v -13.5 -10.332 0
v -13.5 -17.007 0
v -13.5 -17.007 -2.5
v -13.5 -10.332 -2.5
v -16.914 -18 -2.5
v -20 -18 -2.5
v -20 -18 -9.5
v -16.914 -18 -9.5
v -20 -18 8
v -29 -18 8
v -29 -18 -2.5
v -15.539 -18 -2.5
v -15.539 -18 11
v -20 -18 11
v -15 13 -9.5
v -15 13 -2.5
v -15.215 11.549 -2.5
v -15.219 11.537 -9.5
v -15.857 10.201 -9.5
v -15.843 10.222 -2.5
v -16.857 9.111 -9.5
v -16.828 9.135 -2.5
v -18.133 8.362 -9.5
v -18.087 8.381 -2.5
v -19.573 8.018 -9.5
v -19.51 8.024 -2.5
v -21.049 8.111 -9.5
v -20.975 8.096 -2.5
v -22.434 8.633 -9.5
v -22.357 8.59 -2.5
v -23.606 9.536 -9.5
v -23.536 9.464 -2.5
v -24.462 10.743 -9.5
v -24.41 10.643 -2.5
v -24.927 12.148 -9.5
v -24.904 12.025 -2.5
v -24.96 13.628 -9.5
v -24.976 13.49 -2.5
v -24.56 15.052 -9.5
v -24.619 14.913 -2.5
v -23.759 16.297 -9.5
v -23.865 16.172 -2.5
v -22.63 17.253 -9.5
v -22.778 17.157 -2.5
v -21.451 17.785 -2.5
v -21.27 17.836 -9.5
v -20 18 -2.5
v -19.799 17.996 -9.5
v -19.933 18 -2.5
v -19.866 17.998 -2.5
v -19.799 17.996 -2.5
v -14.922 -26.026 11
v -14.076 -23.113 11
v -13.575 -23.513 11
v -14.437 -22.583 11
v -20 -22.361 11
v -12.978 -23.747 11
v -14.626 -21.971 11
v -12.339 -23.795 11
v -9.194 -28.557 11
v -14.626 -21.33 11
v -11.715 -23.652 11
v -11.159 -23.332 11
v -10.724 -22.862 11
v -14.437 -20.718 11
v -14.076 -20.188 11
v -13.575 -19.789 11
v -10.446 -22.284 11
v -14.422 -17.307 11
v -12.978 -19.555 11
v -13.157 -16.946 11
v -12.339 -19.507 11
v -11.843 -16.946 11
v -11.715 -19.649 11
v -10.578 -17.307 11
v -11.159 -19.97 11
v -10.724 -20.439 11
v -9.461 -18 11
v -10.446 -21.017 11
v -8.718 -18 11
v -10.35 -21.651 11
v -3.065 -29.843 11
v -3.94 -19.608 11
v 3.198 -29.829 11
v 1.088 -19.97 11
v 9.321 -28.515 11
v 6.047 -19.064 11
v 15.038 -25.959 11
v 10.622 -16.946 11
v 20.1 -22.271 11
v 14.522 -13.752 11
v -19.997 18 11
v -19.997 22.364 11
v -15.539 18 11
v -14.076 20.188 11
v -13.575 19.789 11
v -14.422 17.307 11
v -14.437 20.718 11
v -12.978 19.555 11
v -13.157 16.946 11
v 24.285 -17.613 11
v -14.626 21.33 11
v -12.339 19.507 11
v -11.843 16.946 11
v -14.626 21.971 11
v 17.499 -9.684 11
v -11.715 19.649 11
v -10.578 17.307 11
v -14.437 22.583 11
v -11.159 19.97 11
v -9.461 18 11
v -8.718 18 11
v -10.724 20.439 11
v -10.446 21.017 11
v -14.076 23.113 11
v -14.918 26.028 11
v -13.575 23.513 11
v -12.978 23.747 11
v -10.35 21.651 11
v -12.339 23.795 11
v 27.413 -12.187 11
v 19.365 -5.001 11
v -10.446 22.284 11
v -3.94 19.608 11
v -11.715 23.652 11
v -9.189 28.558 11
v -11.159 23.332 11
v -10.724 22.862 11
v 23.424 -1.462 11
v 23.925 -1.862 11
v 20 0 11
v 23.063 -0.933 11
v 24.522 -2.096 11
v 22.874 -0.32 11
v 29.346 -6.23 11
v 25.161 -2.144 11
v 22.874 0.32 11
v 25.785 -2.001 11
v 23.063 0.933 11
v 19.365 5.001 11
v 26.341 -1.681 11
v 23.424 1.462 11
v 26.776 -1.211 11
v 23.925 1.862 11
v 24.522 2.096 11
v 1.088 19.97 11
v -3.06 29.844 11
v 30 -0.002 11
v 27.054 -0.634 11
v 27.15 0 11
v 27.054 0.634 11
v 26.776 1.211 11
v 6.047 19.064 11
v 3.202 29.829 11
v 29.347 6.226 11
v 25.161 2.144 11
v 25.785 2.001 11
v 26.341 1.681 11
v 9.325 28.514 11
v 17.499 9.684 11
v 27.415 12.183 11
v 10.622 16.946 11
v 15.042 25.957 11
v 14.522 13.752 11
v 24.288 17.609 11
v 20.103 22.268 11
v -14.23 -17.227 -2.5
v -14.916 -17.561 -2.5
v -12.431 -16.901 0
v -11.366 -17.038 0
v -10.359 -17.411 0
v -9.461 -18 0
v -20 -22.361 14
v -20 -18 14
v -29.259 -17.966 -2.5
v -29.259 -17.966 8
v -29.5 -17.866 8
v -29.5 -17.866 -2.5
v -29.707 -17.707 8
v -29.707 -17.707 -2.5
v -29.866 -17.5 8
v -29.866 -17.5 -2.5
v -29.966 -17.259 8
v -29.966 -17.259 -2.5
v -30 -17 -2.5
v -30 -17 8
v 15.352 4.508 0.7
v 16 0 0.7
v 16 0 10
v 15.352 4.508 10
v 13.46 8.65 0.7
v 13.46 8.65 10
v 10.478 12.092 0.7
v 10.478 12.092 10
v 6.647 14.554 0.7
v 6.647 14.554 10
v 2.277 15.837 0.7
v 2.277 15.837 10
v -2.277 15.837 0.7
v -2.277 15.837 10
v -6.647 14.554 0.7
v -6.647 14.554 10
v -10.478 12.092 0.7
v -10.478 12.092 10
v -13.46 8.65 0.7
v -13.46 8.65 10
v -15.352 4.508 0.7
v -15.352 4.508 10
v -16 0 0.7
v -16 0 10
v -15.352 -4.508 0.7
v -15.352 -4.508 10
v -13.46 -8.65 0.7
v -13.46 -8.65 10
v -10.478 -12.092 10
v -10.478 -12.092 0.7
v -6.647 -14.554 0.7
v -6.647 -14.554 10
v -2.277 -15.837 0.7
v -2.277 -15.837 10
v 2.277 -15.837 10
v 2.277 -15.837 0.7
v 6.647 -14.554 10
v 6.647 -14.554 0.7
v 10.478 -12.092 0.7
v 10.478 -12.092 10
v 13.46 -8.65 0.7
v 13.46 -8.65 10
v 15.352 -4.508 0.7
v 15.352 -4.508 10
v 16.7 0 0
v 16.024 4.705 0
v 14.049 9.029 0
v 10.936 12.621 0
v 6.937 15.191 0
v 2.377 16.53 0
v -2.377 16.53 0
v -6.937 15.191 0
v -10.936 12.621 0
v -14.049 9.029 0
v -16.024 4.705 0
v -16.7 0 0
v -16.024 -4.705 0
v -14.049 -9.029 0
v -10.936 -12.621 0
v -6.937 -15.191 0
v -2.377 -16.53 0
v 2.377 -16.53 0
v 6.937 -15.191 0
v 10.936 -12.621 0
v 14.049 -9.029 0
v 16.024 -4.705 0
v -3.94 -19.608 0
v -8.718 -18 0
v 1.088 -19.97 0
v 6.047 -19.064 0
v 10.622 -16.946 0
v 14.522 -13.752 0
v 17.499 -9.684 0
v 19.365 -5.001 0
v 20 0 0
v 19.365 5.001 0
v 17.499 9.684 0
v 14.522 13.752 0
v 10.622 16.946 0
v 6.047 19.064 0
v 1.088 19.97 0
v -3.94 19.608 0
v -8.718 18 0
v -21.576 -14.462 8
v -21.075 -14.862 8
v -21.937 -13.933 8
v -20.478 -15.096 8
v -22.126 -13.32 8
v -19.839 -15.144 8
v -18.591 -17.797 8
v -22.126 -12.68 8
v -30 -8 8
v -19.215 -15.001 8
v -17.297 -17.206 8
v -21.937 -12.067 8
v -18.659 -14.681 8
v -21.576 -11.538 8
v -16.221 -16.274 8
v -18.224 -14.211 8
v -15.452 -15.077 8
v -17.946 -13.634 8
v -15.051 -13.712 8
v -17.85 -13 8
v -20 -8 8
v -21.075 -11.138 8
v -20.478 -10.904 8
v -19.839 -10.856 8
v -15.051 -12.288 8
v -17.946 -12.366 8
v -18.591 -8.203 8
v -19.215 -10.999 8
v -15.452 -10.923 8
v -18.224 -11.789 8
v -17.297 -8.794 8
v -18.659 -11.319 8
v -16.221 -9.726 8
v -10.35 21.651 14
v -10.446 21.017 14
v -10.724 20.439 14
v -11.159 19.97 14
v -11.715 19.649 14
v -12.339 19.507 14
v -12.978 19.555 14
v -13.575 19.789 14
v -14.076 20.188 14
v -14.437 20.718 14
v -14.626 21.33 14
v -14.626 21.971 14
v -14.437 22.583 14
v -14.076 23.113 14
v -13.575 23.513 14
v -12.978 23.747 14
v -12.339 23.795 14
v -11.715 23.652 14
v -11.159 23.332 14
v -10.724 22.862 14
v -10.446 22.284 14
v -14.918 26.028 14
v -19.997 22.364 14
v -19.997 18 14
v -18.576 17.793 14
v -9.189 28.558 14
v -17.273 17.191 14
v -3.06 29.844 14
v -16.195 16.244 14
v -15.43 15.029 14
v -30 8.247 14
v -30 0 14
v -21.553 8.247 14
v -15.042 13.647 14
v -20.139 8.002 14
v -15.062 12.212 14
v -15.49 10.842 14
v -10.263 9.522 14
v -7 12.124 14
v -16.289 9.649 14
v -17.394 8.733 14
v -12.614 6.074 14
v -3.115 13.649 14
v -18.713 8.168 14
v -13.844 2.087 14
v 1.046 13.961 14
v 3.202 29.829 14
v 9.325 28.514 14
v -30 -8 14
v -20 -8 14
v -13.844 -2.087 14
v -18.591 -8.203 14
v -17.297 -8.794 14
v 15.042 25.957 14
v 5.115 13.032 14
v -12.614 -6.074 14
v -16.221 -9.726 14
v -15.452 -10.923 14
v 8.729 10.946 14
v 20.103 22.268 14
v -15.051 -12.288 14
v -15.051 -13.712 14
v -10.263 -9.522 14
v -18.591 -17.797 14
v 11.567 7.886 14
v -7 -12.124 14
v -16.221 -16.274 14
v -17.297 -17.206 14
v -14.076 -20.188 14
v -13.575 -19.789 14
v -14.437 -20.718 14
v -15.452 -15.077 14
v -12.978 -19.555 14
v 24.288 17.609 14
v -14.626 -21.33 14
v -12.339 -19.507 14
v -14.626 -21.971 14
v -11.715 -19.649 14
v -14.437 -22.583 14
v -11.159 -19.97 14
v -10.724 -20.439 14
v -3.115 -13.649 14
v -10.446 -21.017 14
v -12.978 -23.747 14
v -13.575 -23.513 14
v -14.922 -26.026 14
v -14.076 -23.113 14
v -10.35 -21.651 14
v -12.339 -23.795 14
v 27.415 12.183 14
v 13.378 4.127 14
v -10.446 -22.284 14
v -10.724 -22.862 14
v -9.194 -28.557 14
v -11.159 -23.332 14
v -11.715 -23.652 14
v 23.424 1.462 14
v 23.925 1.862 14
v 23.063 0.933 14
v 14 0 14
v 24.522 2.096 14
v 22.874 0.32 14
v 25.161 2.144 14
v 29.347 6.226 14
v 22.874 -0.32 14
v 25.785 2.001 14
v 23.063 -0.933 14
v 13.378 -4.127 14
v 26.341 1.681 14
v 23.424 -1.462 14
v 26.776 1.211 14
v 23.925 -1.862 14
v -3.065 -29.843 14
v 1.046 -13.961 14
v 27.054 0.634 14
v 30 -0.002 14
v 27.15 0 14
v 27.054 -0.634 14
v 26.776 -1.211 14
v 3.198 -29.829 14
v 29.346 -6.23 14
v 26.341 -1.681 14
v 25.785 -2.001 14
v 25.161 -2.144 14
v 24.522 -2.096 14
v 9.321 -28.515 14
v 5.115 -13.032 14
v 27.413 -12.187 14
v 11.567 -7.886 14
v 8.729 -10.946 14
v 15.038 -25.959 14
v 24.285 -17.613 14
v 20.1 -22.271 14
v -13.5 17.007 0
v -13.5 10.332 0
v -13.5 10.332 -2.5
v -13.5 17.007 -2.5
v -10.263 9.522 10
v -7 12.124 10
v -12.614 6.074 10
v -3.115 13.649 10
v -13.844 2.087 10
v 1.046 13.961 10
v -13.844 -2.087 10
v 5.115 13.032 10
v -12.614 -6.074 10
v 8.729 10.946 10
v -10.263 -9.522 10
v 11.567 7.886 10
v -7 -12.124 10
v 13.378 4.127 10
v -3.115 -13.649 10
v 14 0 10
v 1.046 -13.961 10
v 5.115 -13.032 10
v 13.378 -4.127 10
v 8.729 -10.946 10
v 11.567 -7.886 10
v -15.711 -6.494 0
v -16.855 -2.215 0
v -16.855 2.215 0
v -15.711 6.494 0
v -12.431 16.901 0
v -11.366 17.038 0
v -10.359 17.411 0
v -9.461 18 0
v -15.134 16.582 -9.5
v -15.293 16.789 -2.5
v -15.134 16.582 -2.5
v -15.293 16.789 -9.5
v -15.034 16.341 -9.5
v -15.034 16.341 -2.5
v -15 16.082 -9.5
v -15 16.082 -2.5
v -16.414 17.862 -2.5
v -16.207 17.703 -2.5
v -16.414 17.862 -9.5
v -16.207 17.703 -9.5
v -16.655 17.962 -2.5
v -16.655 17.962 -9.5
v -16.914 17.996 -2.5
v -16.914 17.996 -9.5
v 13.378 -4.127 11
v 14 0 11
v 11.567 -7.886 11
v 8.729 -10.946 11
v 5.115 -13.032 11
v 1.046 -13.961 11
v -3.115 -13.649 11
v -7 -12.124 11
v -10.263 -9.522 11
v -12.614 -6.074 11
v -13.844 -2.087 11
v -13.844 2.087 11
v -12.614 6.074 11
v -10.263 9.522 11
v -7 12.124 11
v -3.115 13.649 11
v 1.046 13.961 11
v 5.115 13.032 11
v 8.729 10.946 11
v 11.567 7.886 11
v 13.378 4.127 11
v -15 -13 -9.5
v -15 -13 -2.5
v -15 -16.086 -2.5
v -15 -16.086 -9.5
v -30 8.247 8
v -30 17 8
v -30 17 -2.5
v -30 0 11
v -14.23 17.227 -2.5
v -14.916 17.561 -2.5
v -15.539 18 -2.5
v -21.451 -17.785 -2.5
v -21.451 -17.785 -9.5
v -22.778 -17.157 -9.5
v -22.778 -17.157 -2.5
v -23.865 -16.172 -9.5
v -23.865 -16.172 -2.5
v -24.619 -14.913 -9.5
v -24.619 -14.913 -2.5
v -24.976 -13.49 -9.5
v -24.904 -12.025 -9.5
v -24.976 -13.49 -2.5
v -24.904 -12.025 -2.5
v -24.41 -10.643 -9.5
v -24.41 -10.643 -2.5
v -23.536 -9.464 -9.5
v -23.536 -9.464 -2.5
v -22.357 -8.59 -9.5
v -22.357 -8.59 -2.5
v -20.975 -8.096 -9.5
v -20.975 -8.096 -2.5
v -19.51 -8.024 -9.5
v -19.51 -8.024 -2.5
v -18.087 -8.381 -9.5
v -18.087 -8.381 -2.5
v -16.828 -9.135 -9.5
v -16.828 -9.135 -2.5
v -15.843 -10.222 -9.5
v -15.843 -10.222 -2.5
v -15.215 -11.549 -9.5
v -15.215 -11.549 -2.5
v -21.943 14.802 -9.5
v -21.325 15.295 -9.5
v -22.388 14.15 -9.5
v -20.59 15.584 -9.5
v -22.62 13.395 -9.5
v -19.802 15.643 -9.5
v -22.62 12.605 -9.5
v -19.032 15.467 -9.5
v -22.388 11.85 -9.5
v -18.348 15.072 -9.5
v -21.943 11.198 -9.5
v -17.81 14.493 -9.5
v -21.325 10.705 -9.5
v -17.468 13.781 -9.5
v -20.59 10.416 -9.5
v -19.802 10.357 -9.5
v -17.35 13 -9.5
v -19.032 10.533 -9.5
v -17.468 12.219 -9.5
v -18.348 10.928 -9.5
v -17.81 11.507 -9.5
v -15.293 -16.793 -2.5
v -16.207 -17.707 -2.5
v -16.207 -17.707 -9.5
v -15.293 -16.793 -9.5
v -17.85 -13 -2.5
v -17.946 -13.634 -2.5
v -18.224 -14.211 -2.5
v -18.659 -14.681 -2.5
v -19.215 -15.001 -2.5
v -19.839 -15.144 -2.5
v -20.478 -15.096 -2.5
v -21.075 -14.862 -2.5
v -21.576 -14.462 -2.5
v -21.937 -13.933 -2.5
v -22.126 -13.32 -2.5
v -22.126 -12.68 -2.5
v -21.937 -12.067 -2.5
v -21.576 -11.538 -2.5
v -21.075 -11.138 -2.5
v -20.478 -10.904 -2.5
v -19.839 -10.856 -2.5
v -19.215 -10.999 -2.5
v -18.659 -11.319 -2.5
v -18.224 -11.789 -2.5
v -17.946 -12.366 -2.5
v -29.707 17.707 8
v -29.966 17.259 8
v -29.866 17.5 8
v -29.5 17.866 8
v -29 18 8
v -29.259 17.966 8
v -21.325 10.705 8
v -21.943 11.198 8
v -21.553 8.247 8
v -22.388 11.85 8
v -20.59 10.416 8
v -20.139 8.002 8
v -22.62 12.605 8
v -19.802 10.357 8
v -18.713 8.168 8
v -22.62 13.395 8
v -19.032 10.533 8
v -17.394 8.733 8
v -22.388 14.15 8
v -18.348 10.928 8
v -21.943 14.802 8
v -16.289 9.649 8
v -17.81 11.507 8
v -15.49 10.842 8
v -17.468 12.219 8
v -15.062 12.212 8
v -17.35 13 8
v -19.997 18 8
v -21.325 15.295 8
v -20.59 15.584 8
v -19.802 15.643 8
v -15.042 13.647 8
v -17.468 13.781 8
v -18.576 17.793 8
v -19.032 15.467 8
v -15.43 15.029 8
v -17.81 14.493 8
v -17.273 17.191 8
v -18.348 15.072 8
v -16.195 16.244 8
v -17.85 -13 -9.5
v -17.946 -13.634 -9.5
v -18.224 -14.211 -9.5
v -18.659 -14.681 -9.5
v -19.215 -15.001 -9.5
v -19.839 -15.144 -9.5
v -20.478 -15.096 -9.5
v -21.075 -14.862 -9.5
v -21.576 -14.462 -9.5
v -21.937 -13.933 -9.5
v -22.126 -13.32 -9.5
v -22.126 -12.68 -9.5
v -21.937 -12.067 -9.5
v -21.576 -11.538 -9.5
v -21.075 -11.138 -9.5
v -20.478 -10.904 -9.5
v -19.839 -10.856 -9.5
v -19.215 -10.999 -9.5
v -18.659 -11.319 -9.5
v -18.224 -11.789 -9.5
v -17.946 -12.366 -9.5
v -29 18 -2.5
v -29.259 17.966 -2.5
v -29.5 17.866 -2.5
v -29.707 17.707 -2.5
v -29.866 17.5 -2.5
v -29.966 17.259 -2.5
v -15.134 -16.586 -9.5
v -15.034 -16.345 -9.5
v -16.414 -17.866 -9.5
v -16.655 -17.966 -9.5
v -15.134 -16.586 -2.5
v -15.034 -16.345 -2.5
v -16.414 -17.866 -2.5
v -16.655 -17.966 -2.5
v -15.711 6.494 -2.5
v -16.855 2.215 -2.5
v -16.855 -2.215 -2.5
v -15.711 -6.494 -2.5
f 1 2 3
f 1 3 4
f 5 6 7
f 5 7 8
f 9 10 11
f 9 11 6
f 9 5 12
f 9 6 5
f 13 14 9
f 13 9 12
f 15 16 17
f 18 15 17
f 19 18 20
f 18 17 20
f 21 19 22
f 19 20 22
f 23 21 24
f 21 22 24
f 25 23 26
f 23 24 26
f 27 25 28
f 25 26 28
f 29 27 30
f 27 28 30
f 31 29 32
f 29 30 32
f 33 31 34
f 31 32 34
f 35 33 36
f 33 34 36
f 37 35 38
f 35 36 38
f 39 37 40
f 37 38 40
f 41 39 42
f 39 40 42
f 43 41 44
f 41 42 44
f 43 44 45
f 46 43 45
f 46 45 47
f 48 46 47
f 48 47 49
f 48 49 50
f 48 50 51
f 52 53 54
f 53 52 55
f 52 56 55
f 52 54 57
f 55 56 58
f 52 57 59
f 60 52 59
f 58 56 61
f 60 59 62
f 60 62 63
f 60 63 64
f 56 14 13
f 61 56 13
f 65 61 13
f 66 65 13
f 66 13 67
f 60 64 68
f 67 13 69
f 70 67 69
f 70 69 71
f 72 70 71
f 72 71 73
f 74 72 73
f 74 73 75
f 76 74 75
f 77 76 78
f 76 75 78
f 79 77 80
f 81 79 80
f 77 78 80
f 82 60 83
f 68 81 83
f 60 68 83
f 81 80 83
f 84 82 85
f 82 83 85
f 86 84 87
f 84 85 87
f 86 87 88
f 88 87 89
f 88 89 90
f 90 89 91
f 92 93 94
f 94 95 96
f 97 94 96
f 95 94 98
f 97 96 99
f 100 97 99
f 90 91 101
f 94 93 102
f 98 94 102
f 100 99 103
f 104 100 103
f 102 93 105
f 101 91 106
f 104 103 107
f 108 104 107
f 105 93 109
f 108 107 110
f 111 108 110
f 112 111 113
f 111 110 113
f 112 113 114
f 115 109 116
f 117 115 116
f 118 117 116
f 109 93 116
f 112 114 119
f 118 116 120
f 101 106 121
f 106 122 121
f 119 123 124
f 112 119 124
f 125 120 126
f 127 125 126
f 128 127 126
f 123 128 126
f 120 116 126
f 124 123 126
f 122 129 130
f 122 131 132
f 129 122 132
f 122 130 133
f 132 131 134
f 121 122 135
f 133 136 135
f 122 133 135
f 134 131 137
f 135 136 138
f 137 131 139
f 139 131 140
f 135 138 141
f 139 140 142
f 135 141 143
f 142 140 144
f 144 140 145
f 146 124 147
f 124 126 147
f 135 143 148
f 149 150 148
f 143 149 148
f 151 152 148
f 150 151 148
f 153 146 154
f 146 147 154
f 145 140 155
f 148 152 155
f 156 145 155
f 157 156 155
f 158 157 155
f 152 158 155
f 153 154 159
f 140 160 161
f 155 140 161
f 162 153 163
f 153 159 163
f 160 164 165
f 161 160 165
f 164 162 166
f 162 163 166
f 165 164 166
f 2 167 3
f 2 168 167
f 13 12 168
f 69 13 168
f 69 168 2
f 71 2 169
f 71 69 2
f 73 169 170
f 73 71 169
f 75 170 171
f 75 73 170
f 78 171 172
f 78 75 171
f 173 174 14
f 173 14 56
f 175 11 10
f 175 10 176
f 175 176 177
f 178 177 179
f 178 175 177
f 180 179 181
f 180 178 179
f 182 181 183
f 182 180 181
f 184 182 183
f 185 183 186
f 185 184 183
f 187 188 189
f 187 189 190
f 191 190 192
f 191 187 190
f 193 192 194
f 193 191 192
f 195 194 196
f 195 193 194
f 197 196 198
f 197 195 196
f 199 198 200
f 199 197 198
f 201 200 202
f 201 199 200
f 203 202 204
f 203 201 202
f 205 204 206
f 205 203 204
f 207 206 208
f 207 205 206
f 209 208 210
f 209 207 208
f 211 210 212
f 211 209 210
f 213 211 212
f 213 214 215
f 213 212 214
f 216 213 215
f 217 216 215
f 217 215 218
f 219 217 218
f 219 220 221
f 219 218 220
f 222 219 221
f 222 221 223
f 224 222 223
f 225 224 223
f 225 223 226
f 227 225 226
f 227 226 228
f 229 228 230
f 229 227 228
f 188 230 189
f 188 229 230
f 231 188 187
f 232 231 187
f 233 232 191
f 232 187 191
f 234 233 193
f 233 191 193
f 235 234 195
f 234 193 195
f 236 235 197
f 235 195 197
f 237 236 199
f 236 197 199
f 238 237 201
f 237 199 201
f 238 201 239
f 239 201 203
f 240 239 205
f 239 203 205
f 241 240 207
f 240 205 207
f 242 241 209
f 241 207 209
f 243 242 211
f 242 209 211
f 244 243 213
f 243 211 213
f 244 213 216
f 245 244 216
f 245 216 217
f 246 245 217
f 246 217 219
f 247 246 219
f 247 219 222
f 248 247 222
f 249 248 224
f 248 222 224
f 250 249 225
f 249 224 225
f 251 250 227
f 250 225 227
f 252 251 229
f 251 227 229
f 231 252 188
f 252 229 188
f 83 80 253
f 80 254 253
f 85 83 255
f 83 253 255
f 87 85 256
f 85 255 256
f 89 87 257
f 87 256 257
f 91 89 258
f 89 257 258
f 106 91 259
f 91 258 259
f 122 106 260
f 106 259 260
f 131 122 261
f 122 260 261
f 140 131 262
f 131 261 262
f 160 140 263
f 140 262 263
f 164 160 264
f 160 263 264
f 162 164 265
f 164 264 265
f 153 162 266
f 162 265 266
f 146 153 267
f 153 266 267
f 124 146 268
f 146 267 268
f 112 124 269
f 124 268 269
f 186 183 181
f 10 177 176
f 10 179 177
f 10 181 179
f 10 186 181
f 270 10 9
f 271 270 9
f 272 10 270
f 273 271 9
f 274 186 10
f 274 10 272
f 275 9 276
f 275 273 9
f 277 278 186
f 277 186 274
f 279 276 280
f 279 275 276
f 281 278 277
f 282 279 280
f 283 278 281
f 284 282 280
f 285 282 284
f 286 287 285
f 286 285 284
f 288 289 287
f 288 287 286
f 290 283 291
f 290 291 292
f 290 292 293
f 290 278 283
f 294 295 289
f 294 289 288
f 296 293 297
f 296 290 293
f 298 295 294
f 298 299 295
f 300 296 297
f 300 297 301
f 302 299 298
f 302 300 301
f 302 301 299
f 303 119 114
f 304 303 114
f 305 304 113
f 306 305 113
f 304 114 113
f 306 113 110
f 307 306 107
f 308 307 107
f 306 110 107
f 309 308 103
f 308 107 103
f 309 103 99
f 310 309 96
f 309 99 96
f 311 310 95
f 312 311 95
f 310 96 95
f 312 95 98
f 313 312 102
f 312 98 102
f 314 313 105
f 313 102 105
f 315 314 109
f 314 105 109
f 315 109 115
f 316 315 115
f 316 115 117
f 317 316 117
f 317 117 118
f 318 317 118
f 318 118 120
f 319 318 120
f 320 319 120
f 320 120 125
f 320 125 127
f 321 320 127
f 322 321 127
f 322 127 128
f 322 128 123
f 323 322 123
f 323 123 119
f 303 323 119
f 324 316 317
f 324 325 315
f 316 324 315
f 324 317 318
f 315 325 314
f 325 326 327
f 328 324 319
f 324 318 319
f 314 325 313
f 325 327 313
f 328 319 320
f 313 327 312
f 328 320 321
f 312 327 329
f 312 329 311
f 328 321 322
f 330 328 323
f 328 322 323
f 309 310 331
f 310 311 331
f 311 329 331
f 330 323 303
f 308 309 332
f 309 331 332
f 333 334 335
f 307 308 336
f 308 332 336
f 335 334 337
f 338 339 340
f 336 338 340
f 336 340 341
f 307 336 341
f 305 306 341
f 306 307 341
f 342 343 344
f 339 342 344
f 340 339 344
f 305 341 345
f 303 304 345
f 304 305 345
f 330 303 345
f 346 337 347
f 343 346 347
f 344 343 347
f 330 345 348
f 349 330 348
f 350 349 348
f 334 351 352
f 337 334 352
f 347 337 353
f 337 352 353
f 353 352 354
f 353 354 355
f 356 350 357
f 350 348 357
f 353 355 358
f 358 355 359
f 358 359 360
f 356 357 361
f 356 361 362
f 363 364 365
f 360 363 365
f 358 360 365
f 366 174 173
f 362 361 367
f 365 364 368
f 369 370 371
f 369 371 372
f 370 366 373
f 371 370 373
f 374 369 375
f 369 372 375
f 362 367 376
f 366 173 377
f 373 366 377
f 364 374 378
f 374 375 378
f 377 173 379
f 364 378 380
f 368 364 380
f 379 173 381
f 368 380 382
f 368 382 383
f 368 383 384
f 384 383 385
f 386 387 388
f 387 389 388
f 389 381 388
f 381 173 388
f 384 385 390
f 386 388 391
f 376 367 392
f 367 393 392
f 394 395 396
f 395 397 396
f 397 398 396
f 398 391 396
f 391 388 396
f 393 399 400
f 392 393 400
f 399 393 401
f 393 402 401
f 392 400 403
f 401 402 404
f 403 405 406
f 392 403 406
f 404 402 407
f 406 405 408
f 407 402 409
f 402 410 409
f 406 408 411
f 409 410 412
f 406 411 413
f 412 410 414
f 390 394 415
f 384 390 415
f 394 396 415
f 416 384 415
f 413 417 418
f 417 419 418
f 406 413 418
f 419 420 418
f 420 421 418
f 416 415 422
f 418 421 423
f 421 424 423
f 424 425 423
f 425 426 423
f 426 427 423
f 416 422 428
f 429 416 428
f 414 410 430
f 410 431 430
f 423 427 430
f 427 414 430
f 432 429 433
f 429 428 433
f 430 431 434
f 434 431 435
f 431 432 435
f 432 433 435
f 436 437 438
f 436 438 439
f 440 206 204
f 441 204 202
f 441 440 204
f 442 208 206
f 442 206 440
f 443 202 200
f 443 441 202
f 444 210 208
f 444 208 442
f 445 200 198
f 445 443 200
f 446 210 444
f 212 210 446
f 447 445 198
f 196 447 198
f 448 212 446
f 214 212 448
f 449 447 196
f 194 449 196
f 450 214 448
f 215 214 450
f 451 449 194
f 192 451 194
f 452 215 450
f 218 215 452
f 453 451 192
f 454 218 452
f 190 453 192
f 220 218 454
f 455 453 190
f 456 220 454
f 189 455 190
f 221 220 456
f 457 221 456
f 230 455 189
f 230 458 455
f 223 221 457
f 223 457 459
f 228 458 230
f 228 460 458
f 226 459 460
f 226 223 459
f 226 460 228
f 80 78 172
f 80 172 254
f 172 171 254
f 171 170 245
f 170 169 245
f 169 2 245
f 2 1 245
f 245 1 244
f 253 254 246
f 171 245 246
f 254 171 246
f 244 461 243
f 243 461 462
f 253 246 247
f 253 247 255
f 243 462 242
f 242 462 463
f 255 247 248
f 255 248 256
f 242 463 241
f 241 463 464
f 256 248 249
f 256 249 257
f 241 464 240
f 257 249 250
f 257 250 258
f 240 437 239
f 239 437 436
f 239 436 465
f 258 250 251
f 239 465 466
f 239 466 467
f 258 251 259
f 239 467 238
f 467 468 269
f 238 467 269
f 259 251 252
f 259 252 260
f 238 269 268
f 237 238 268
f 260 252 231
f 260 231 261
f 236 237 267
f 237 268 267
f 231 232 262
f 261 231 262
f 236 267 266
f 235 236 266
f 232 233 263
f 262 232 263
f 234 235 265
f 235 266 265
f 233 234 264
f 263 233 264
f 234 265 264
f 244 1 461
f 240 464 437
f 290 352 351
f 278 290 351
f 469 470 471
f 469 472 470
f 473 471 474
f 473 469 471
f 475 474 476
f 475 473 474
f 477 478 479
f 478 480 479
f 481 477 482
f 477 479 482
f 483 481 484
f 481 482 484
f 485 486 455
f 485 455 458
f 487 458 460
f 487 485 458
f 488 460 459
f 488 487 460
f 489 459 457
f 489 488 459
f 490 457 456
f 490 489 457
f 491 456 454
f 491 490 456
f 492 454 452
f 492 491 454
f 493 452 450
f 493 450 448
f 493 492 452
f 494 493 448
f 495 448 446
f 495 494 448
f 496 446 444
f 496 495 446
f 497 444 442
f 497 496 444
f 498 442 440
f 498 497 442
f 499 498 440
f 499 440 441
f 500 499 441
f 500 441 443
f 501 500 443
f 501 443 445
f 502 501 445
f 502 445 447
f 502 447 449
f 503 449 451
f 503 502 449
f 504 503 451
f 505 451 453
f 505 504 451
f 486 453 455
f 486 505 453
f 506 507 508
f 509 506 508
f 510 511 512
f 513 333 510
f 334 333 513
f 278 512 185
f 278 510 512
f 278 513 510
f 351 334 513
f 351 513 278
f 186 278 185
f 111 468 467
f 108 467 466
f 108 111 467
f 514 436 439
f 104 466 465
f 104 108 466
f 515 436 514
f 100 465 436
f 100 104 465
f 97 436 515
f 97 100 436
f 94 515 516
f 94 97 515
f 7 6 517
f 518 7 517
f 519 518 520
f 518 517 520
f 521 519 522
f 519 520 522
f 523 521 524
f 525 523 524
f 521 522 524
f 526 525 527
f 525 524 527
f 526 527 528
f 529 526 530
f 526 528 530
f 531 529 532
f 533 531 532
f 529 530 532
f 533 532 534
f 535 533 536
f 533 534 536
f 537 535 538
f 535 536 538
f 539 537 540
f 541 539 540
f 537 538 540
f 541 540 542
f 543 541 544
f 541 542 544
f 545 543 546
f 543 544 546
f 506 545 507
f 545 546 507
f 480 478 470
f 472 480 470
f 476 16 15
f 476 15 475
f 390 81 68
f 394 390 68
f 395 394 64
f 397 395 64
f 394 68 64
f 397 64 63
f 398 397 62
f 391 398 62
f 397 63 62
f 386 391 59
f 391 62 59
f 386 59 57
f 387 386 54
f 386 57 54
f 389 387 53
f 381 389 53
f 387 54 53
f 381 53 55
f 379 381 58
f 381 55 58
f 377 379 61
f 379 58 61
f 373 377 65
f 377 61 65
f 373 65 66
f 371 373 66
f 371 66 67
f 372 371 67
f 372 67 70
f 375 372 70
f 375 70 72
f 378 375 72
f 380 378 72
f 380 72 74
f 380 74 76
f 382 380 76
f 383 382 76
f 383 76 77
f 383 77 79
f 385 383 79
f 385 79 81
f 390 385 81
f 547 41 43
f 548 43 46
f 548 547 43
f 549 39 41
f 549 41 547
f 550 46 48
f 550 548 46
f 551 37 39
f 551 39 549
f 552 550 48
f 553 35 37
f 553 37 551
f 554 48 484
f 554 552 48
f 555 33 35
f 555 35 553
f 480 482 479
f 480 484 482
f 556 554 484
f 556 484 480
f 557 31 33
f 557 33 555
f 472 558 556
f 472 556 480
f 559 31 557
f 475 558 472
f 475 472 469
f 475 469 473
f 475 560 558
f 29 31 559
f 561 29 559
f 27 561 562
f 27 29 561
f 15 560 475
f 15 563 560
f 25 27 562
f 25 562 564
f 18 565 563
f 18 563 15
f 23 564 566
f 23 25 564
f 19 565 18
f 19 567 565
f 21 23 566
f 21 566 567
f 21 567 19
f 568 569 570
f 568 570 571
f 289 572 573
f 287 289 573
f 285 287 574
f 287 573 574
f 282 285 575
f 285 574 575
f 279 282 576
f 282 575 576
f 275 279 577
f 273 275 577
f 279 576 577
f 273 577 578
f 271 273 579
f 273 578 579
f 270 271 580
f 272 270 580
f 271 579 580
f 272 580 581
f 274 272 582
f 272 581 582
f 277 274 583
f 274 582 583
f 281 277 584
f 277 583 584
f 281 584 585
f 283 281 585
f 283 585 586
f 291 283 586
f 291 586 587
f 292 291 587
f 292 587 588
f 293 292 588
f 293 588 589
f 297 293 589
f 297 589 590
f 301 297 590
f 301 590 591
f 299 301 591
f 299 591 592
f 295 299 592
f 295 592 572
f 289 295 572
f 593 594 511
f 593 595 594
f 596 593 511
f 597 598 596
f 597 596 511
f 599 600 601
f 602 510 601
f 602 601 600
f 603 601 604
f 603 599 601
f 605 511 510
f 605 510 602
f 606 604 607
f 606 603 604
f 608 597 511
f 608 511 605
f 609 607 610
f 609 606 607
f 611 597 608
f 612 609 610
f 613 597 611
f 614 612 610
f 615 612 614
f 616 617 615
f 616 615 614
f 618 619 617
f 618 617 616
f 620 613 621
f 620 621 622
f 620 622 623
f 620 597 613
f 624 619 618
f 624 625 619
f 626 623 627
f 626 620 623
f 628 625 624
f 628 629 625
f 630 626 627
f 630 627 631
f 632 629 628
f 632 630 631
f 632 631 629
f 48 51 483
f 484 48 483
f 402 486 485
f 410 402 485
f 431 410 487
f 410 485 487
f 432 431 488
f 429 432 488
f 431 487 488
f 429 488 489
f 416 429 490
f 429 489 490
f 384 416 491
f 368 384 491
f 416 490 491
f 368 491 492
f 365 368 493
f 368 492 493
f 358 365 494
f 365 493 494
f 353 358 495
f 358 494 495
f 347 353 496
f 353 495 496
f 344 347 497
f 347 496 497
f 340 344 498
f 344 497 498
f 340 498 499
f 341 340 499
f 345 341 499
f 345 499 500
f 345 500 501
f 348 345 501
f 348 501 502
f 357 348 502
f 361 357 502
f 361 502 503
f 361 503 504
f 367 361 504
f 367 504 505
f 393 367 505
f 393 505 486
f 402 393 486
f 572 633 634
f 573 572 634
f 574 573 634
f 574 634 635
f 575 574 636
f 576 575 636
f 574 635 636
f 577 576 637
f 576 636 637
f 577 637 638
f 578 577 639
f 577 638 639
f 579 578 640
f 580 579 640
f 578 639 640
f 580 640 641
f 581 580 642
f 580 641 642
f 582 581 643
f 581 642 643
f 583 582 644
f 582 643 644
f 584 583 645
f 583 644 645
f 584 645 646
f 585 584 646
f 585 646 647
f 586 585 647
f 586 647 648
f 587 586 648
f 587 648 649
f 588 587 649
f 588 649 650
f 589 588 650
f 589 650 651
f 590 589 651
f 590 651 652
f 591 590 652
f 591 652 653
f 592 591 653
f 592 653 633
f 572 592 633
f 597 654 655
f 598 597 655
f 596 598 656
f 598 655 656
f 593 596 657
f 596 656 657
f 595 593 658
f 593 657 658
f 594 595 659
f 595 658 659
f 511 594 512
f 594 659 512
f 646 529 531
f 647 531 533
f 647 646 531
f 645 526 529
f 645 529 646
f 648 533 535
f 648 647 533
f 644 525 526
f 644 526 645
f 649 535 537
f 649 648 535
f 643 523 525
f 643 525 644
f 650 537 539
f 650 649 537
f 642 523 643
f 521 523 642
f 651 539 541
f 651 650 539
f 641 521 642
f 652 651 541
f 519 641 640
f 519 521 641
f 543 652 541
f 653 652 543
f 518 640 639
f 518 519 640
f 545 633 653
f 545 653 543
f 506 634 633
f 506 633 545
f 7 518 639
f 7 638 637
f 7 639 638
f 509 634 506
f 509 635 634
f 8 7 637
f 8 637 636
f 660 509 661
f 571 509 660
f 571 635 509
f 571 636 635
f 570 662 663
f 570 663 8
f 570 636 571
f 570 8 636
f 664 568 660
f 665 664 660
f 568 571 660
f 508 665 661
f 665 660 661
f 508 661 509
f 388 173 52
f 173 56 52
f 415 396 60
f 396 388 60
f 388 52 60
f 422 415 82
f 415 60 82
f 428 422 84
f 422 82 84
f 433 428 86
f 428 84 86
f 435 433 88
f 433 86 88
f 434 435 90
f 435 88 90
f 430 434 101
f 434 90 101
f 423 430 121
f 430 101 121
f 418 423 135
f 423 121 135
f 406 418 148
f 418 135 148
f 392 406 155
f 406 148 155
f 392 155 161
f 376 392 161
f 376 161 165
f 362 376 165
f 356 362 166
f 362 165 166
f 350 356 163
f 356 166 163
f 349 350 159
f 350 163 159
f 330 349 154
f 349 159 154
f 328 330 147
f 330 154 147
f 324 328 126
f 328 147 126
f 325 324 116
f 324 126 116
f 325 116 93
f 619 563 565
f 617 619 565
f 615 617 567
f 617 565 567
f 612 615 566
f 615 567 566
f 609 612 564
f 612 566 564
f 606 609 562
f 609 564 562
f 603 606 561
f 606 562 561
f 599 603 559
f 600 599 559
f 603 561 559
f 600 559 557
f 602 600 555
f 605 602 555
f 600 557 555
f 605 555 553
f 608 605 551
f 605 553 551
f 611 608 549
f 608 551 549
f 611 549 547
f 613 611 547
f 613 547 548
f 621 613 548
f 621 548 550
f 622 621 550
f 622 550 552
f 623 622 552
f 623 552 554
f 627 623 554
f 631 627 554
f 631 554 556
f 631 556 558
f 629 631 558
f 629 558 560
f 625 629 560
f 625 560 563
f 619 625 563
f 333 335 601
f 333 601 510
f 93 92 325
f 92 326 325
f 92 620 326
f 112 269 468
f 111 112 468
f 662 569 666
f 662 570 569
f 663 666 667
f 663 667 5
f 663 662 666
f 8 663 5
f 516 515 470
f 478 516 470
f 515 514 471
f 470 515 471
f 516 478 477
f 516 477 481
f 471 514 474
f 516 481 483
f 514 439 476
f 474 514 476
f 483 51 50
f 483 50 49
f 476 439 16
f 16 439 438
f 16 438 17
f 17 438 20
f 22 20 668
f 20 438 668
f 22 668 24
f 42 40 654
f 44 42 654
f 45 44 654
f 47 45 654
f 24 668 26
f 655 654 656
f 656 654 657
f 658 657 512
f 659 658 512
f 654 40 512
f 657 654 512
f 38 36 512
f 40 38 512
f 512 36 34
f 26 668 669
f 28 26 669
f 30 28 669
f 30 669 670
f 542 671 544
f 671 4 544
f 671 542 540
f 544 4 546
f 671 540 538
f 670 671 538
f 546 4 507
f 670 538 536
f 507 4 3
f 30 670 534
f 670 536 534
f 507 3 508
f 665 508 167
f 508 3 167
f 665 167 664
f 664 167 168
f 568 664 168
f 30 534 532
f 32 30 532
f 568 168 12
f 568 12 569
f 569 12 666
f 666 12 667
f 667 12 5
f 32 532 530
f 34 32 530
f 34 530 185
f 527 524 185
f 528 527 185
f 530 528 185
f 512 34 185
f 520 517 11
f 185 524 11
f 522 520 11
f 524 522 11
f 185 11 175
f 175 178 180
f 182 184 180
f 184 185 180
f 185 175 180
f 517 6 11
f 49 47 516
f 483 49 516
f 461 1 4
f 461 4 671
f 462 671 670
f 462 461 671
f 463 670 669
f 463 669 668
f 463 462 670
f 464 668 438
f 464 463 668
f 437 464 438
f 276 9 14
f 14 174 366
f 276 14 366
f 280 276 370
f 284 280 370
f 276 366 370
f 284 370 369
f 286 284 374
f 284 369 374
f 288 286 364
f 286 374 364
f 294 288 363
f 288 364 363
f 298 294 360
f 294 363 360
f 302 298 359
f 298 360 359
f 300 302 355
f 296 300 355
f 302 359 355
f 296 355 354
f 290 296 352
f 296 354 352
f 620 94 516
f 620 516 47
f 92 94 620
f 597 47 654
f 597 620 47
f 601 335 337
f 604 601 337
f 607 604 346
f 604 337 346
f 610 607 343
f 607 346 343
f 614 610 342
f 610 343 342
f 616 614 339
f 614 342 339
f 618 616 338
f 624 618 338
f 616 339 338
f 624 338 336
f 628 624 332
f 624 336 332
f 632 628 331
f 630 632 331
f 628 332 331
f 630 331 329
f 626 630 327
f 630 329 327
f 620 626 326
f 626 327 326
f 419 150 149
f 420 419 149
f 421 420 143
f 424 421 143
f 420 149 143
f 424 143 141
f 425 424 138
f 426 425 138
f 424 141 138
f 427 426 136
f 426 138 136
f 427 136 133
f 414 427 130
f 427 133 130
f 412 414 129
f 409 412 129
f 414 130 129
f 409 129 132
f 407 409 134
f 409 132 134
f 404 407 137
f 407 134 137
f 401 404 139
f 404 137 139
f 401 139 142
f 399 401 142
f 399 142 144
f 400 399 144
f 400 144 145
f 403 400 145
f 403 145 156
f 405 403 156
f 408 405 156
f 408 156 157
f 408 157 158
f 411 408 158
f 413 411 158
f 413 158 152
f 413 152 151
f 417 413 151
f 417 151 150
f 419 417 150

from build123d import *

# Parameters (mm, degrees)
SKETCH_R        = 20
SKETCH_R_2      = 16
PAD_DEPTH       = 11
SKETCH001_R     = 30
PAD001_DEPTH    = 3
SKETCH002_R     = 16
SKETCH002_R_2   = 14
PAD002_DEPTH    = 1
SKETCH003_R     = 14
POCKET_DEPTH    = 3.001
SKETCH004_R     = 16
PAD003_DEPTH    = 14
PAD004_DEPTH    = 2.5
SKETCH007_R     = 2.15
SKETCH007_R_2   = 2.65
POCKET001_DEPTH = 23.501
SKETCH008_R     = 2.15
POCKET002_DEPTH = 3.001
SKETCH009_R     = 4.75
POCKET003_DEPTH = 13.501
PAD005_DEPTH    = 7
SKETCH011_R     = 2.15
SKETCH011_R_2   = 2.65
POCKET004_DEPTH = 23.501
FILLET_R        = 1
CHAMFER_SIZE    = 0.7
FILLET001_R     = 1
POCKET005_DEPTH = 6


with BuildPart() as part:
    # Sketch → Pad (new body)
    with BuildSketch(Plane.XY):
        Circle(SKETCH_R)
        Circle(SKETCH_R_2, mode=Mode.SUBTRACT)
    extrude(amount=PAD_DEPTH)

    # Sketch001 (on Face4 of Pad) → Pad001 (join)
    with BuildSketch(Plane.XY.offset(11)):
        Circle(SKETCH001_R)
    extrude(amount=PAD001_DEPTH)

    # Sketch002 (on Face7 of Pad001) → Pad002 (join)
    with BuildSketch(Plane(origin=(0, 0, 11), x_dir=(1, 0, 0), z_dir=(0, 0, -1))):
        Circle(SKETCH002_R)
        Circle(SKETCH002_R_2, mode=Mode.SUBTRACT)
    extrude(amount=PAD002_DEPTH)

    # Sketch003 (on Face9 of Pad002) → Pocket (cut, through all)
    with BuildSketch(Plane(origin=(0, 0, 11), x_dir=(1, 0, 0), z_dir=(0, 0, -1))):
        Circle(SKETCH003_R)
    extrude(amount=-POCKET_DEPTH, mode=Mode.SUBTRACT)

    # Sketch004 (on Face6 of Pocket) → Pad003 (join)
    with BuildSketch(Plane(origin=(0, 0, 0), x_dir=(1, 0, 0), z_dir=(0, 0, -1))):
        with BuildLine():
            ThreePointArc((-8.717798, -18), (20, 0), (-8.717798, 18))
            Line((-30, 18), (-8.717798, 18))
            Line((-30, -18), (-30, 18))
            Line((-8.717798, -18), (-30, -18))
        make_face()
        Circle(SKETCH004_R, mode=Mode.SUBTRACT)
    extrude(amount=-PAD003_DEPTH)

    # Sketch005 (on Face9 of Pad003) → Pad004 (join)
    with BuildSketch(Plane(origin=(0, 0, 0), x_dir=(1, 0, 0), z_dir=(0, 0, -1))):
        with BuildLine():
            Line((-30, 18), (-13.5, 18))
            Line((-13.5, 18), (-13.5, 10.331989))
            ThreePointArc((-13.5, 10.331989), (-17, 0), (-13.5, -10.331989))
            Line((-13.5, -10.331989), (-13.5, -18))
            Line((-13.5, -18), (-30, -18))
            Line((-30, -18), (-30, 18))
        make_face()
    extrude(amount=PAD004_DEPTH)

    # Sketch007 → Pocket001 (cut, through all)
    with BuildSketch(Plane(origin=(0, 0, -9.5), x_dir=(1, 0, 0), z_dir=(0, 0, -1))):
        with Locations((-20, 13)):
            Circle(SKETCH007_R)
        with Locations((-20, -13)):
            Circle(SKETCH007_R_2)
    extrude(amount=-POCKET001_DEPTH, mode=Mode.SUBTRACT)

    # Sketch008 (on Face2 of Pocket001) → Pocket002 (cut, through all)
    with BuildSketch(Plane(origin=(0, 0, 11), x_dir=(1, 0, 0), z_dir=(0, 0, -1))):
        with Locations((25, 0)):
            Circle(SKETCH008_R)
        with Locations((-12.5, 21.650635)):
            Circle(SKETCH008_R)
        with Locations((-12.5, -21.650635)):
            Circle(SKETCH008_R)
    extrude(amount=-POCKET002_DEPTH, mode=Mode.SUBTRACT)

    # Sketch009 (on Face2 of Pocket002) → Pocket003 (cut, through all)
    with BuildSketch(Plane(origin=(0, 0, 11), x_dir=(1, 0, 0), z_dir=(0, 0, -1))):
        with Locations((-12.5, -21.650635)):
            Circle(SKETCH009_R)
        with Locations((-12.5, 21.650635)):
            Circle(SKETCH009_R)
    extrude(amount=POCKET003_DEPTH, mode=Mode.SUBTRACT)

    # Sketch010 (on Face30 of Pocket003) → Pad005 (join)
    with BuildSketch(Plane(origin=(0, 0, -2.5), x_dir=(1, 0, 0), z_dir=(0, 0, -1))):
        with BuildLine():
            ThreePointArc((-15, -13), (-23.605937, -9.536299), (-19.798889, -17.995954))
            Line((-19.798889, -17.995954), (-16.5, -17.995954))
            Line((-16.5, -17.995954), (-15, -16.495954))
            Line((-15, -13), (-15, -16.495954))
        make_face()
        with BuildLine():
            ThreePointArc((-20, 18), (-23.535534, 9.464466), (-15, 13))
            Line((-15, 13), (-15, 16.5))
            Line((-16.5, 18), (-15, 16.5))
            Line((-20, 18), (-16.5, 18))
        make_face()
    extrude(amount=PAD005_DEPTH)

    # Sketch011 (on Face49 of Pad005) → Pocket004 (cut, through all)
    with BuildSketch(Plane(origin=(0, 0, -9.5), x_dir=(1, 0, 0), z_dir=(0, 0, -1))):
        with Locations((-20, 13)):
            Circle(SKETCH011_R)
        with Locations((-20, -13)):
            Circle(SKETCH011_R_2)
    extrude(amount=-POCKET004_DEPTH, mode=Mode.SUBTRACT)

    # Fillet
    fillet_edges = [part.edges().sort_by_distance(p)[0] for p in [
        (-16.5, 17.995954, -6),
        (-15, 16.495954, -6),
        (-15, -16.5, -6),
        (-16.5, -18, -6),
    ]]
    fillet(fillet_edges, radius=FILLET_R)

    # Chamfer
    chamfer_edges = [part.edges().sort_by_distance(p)[0] for p in [
        (-16, 0, 0),
    ]]
    chamfer(chamfer_edges, length=CHAMFER_SIZE)

    # Fillet001
    fillet001_edges = [part.edges().sort_by_distance(p)[0] for p in [
        (-30, 18, 7),
        (-30, 18, -1.25),
        (-30, -18, -1.25),
        (-30, -18, 7),
    ]]
    fillet(fillet001_edges, radius=FILLET001_R)

    # Sketch012 (on Face50 of Fillet001) → Pocket005 (cut)
    with BuildSketch(Plane.XY.offset(14)):
        with BuildLine():
            ThreePointArc((-21.553244, 8.247376), (-15.062485, 12.212001), (-19.996782, 17.999999))
            Line((-19.996782, 17.999999), (-19.996782, 34.276657))
            Line((-19.996782, 34.276657), (-36.551773, 8.247376))
            Line((-21.553244, 8.247376), (-36.551773, 8.247376))
        make_face()
        with BuildLine():
            ThreePointArc((-20, -18), (-15, -13), (-20, -8))
            Line((-20, -8), (-40.401188, -8))
            Line((-20, -33.121502), (-40.401188, -8))
            Line((-20, -18), (-20, -33.121502))
        make_face()
    extrude(amount=-POCKET005_DEPTH, mode=Mode.SUBTRACT)


solid = part.part
